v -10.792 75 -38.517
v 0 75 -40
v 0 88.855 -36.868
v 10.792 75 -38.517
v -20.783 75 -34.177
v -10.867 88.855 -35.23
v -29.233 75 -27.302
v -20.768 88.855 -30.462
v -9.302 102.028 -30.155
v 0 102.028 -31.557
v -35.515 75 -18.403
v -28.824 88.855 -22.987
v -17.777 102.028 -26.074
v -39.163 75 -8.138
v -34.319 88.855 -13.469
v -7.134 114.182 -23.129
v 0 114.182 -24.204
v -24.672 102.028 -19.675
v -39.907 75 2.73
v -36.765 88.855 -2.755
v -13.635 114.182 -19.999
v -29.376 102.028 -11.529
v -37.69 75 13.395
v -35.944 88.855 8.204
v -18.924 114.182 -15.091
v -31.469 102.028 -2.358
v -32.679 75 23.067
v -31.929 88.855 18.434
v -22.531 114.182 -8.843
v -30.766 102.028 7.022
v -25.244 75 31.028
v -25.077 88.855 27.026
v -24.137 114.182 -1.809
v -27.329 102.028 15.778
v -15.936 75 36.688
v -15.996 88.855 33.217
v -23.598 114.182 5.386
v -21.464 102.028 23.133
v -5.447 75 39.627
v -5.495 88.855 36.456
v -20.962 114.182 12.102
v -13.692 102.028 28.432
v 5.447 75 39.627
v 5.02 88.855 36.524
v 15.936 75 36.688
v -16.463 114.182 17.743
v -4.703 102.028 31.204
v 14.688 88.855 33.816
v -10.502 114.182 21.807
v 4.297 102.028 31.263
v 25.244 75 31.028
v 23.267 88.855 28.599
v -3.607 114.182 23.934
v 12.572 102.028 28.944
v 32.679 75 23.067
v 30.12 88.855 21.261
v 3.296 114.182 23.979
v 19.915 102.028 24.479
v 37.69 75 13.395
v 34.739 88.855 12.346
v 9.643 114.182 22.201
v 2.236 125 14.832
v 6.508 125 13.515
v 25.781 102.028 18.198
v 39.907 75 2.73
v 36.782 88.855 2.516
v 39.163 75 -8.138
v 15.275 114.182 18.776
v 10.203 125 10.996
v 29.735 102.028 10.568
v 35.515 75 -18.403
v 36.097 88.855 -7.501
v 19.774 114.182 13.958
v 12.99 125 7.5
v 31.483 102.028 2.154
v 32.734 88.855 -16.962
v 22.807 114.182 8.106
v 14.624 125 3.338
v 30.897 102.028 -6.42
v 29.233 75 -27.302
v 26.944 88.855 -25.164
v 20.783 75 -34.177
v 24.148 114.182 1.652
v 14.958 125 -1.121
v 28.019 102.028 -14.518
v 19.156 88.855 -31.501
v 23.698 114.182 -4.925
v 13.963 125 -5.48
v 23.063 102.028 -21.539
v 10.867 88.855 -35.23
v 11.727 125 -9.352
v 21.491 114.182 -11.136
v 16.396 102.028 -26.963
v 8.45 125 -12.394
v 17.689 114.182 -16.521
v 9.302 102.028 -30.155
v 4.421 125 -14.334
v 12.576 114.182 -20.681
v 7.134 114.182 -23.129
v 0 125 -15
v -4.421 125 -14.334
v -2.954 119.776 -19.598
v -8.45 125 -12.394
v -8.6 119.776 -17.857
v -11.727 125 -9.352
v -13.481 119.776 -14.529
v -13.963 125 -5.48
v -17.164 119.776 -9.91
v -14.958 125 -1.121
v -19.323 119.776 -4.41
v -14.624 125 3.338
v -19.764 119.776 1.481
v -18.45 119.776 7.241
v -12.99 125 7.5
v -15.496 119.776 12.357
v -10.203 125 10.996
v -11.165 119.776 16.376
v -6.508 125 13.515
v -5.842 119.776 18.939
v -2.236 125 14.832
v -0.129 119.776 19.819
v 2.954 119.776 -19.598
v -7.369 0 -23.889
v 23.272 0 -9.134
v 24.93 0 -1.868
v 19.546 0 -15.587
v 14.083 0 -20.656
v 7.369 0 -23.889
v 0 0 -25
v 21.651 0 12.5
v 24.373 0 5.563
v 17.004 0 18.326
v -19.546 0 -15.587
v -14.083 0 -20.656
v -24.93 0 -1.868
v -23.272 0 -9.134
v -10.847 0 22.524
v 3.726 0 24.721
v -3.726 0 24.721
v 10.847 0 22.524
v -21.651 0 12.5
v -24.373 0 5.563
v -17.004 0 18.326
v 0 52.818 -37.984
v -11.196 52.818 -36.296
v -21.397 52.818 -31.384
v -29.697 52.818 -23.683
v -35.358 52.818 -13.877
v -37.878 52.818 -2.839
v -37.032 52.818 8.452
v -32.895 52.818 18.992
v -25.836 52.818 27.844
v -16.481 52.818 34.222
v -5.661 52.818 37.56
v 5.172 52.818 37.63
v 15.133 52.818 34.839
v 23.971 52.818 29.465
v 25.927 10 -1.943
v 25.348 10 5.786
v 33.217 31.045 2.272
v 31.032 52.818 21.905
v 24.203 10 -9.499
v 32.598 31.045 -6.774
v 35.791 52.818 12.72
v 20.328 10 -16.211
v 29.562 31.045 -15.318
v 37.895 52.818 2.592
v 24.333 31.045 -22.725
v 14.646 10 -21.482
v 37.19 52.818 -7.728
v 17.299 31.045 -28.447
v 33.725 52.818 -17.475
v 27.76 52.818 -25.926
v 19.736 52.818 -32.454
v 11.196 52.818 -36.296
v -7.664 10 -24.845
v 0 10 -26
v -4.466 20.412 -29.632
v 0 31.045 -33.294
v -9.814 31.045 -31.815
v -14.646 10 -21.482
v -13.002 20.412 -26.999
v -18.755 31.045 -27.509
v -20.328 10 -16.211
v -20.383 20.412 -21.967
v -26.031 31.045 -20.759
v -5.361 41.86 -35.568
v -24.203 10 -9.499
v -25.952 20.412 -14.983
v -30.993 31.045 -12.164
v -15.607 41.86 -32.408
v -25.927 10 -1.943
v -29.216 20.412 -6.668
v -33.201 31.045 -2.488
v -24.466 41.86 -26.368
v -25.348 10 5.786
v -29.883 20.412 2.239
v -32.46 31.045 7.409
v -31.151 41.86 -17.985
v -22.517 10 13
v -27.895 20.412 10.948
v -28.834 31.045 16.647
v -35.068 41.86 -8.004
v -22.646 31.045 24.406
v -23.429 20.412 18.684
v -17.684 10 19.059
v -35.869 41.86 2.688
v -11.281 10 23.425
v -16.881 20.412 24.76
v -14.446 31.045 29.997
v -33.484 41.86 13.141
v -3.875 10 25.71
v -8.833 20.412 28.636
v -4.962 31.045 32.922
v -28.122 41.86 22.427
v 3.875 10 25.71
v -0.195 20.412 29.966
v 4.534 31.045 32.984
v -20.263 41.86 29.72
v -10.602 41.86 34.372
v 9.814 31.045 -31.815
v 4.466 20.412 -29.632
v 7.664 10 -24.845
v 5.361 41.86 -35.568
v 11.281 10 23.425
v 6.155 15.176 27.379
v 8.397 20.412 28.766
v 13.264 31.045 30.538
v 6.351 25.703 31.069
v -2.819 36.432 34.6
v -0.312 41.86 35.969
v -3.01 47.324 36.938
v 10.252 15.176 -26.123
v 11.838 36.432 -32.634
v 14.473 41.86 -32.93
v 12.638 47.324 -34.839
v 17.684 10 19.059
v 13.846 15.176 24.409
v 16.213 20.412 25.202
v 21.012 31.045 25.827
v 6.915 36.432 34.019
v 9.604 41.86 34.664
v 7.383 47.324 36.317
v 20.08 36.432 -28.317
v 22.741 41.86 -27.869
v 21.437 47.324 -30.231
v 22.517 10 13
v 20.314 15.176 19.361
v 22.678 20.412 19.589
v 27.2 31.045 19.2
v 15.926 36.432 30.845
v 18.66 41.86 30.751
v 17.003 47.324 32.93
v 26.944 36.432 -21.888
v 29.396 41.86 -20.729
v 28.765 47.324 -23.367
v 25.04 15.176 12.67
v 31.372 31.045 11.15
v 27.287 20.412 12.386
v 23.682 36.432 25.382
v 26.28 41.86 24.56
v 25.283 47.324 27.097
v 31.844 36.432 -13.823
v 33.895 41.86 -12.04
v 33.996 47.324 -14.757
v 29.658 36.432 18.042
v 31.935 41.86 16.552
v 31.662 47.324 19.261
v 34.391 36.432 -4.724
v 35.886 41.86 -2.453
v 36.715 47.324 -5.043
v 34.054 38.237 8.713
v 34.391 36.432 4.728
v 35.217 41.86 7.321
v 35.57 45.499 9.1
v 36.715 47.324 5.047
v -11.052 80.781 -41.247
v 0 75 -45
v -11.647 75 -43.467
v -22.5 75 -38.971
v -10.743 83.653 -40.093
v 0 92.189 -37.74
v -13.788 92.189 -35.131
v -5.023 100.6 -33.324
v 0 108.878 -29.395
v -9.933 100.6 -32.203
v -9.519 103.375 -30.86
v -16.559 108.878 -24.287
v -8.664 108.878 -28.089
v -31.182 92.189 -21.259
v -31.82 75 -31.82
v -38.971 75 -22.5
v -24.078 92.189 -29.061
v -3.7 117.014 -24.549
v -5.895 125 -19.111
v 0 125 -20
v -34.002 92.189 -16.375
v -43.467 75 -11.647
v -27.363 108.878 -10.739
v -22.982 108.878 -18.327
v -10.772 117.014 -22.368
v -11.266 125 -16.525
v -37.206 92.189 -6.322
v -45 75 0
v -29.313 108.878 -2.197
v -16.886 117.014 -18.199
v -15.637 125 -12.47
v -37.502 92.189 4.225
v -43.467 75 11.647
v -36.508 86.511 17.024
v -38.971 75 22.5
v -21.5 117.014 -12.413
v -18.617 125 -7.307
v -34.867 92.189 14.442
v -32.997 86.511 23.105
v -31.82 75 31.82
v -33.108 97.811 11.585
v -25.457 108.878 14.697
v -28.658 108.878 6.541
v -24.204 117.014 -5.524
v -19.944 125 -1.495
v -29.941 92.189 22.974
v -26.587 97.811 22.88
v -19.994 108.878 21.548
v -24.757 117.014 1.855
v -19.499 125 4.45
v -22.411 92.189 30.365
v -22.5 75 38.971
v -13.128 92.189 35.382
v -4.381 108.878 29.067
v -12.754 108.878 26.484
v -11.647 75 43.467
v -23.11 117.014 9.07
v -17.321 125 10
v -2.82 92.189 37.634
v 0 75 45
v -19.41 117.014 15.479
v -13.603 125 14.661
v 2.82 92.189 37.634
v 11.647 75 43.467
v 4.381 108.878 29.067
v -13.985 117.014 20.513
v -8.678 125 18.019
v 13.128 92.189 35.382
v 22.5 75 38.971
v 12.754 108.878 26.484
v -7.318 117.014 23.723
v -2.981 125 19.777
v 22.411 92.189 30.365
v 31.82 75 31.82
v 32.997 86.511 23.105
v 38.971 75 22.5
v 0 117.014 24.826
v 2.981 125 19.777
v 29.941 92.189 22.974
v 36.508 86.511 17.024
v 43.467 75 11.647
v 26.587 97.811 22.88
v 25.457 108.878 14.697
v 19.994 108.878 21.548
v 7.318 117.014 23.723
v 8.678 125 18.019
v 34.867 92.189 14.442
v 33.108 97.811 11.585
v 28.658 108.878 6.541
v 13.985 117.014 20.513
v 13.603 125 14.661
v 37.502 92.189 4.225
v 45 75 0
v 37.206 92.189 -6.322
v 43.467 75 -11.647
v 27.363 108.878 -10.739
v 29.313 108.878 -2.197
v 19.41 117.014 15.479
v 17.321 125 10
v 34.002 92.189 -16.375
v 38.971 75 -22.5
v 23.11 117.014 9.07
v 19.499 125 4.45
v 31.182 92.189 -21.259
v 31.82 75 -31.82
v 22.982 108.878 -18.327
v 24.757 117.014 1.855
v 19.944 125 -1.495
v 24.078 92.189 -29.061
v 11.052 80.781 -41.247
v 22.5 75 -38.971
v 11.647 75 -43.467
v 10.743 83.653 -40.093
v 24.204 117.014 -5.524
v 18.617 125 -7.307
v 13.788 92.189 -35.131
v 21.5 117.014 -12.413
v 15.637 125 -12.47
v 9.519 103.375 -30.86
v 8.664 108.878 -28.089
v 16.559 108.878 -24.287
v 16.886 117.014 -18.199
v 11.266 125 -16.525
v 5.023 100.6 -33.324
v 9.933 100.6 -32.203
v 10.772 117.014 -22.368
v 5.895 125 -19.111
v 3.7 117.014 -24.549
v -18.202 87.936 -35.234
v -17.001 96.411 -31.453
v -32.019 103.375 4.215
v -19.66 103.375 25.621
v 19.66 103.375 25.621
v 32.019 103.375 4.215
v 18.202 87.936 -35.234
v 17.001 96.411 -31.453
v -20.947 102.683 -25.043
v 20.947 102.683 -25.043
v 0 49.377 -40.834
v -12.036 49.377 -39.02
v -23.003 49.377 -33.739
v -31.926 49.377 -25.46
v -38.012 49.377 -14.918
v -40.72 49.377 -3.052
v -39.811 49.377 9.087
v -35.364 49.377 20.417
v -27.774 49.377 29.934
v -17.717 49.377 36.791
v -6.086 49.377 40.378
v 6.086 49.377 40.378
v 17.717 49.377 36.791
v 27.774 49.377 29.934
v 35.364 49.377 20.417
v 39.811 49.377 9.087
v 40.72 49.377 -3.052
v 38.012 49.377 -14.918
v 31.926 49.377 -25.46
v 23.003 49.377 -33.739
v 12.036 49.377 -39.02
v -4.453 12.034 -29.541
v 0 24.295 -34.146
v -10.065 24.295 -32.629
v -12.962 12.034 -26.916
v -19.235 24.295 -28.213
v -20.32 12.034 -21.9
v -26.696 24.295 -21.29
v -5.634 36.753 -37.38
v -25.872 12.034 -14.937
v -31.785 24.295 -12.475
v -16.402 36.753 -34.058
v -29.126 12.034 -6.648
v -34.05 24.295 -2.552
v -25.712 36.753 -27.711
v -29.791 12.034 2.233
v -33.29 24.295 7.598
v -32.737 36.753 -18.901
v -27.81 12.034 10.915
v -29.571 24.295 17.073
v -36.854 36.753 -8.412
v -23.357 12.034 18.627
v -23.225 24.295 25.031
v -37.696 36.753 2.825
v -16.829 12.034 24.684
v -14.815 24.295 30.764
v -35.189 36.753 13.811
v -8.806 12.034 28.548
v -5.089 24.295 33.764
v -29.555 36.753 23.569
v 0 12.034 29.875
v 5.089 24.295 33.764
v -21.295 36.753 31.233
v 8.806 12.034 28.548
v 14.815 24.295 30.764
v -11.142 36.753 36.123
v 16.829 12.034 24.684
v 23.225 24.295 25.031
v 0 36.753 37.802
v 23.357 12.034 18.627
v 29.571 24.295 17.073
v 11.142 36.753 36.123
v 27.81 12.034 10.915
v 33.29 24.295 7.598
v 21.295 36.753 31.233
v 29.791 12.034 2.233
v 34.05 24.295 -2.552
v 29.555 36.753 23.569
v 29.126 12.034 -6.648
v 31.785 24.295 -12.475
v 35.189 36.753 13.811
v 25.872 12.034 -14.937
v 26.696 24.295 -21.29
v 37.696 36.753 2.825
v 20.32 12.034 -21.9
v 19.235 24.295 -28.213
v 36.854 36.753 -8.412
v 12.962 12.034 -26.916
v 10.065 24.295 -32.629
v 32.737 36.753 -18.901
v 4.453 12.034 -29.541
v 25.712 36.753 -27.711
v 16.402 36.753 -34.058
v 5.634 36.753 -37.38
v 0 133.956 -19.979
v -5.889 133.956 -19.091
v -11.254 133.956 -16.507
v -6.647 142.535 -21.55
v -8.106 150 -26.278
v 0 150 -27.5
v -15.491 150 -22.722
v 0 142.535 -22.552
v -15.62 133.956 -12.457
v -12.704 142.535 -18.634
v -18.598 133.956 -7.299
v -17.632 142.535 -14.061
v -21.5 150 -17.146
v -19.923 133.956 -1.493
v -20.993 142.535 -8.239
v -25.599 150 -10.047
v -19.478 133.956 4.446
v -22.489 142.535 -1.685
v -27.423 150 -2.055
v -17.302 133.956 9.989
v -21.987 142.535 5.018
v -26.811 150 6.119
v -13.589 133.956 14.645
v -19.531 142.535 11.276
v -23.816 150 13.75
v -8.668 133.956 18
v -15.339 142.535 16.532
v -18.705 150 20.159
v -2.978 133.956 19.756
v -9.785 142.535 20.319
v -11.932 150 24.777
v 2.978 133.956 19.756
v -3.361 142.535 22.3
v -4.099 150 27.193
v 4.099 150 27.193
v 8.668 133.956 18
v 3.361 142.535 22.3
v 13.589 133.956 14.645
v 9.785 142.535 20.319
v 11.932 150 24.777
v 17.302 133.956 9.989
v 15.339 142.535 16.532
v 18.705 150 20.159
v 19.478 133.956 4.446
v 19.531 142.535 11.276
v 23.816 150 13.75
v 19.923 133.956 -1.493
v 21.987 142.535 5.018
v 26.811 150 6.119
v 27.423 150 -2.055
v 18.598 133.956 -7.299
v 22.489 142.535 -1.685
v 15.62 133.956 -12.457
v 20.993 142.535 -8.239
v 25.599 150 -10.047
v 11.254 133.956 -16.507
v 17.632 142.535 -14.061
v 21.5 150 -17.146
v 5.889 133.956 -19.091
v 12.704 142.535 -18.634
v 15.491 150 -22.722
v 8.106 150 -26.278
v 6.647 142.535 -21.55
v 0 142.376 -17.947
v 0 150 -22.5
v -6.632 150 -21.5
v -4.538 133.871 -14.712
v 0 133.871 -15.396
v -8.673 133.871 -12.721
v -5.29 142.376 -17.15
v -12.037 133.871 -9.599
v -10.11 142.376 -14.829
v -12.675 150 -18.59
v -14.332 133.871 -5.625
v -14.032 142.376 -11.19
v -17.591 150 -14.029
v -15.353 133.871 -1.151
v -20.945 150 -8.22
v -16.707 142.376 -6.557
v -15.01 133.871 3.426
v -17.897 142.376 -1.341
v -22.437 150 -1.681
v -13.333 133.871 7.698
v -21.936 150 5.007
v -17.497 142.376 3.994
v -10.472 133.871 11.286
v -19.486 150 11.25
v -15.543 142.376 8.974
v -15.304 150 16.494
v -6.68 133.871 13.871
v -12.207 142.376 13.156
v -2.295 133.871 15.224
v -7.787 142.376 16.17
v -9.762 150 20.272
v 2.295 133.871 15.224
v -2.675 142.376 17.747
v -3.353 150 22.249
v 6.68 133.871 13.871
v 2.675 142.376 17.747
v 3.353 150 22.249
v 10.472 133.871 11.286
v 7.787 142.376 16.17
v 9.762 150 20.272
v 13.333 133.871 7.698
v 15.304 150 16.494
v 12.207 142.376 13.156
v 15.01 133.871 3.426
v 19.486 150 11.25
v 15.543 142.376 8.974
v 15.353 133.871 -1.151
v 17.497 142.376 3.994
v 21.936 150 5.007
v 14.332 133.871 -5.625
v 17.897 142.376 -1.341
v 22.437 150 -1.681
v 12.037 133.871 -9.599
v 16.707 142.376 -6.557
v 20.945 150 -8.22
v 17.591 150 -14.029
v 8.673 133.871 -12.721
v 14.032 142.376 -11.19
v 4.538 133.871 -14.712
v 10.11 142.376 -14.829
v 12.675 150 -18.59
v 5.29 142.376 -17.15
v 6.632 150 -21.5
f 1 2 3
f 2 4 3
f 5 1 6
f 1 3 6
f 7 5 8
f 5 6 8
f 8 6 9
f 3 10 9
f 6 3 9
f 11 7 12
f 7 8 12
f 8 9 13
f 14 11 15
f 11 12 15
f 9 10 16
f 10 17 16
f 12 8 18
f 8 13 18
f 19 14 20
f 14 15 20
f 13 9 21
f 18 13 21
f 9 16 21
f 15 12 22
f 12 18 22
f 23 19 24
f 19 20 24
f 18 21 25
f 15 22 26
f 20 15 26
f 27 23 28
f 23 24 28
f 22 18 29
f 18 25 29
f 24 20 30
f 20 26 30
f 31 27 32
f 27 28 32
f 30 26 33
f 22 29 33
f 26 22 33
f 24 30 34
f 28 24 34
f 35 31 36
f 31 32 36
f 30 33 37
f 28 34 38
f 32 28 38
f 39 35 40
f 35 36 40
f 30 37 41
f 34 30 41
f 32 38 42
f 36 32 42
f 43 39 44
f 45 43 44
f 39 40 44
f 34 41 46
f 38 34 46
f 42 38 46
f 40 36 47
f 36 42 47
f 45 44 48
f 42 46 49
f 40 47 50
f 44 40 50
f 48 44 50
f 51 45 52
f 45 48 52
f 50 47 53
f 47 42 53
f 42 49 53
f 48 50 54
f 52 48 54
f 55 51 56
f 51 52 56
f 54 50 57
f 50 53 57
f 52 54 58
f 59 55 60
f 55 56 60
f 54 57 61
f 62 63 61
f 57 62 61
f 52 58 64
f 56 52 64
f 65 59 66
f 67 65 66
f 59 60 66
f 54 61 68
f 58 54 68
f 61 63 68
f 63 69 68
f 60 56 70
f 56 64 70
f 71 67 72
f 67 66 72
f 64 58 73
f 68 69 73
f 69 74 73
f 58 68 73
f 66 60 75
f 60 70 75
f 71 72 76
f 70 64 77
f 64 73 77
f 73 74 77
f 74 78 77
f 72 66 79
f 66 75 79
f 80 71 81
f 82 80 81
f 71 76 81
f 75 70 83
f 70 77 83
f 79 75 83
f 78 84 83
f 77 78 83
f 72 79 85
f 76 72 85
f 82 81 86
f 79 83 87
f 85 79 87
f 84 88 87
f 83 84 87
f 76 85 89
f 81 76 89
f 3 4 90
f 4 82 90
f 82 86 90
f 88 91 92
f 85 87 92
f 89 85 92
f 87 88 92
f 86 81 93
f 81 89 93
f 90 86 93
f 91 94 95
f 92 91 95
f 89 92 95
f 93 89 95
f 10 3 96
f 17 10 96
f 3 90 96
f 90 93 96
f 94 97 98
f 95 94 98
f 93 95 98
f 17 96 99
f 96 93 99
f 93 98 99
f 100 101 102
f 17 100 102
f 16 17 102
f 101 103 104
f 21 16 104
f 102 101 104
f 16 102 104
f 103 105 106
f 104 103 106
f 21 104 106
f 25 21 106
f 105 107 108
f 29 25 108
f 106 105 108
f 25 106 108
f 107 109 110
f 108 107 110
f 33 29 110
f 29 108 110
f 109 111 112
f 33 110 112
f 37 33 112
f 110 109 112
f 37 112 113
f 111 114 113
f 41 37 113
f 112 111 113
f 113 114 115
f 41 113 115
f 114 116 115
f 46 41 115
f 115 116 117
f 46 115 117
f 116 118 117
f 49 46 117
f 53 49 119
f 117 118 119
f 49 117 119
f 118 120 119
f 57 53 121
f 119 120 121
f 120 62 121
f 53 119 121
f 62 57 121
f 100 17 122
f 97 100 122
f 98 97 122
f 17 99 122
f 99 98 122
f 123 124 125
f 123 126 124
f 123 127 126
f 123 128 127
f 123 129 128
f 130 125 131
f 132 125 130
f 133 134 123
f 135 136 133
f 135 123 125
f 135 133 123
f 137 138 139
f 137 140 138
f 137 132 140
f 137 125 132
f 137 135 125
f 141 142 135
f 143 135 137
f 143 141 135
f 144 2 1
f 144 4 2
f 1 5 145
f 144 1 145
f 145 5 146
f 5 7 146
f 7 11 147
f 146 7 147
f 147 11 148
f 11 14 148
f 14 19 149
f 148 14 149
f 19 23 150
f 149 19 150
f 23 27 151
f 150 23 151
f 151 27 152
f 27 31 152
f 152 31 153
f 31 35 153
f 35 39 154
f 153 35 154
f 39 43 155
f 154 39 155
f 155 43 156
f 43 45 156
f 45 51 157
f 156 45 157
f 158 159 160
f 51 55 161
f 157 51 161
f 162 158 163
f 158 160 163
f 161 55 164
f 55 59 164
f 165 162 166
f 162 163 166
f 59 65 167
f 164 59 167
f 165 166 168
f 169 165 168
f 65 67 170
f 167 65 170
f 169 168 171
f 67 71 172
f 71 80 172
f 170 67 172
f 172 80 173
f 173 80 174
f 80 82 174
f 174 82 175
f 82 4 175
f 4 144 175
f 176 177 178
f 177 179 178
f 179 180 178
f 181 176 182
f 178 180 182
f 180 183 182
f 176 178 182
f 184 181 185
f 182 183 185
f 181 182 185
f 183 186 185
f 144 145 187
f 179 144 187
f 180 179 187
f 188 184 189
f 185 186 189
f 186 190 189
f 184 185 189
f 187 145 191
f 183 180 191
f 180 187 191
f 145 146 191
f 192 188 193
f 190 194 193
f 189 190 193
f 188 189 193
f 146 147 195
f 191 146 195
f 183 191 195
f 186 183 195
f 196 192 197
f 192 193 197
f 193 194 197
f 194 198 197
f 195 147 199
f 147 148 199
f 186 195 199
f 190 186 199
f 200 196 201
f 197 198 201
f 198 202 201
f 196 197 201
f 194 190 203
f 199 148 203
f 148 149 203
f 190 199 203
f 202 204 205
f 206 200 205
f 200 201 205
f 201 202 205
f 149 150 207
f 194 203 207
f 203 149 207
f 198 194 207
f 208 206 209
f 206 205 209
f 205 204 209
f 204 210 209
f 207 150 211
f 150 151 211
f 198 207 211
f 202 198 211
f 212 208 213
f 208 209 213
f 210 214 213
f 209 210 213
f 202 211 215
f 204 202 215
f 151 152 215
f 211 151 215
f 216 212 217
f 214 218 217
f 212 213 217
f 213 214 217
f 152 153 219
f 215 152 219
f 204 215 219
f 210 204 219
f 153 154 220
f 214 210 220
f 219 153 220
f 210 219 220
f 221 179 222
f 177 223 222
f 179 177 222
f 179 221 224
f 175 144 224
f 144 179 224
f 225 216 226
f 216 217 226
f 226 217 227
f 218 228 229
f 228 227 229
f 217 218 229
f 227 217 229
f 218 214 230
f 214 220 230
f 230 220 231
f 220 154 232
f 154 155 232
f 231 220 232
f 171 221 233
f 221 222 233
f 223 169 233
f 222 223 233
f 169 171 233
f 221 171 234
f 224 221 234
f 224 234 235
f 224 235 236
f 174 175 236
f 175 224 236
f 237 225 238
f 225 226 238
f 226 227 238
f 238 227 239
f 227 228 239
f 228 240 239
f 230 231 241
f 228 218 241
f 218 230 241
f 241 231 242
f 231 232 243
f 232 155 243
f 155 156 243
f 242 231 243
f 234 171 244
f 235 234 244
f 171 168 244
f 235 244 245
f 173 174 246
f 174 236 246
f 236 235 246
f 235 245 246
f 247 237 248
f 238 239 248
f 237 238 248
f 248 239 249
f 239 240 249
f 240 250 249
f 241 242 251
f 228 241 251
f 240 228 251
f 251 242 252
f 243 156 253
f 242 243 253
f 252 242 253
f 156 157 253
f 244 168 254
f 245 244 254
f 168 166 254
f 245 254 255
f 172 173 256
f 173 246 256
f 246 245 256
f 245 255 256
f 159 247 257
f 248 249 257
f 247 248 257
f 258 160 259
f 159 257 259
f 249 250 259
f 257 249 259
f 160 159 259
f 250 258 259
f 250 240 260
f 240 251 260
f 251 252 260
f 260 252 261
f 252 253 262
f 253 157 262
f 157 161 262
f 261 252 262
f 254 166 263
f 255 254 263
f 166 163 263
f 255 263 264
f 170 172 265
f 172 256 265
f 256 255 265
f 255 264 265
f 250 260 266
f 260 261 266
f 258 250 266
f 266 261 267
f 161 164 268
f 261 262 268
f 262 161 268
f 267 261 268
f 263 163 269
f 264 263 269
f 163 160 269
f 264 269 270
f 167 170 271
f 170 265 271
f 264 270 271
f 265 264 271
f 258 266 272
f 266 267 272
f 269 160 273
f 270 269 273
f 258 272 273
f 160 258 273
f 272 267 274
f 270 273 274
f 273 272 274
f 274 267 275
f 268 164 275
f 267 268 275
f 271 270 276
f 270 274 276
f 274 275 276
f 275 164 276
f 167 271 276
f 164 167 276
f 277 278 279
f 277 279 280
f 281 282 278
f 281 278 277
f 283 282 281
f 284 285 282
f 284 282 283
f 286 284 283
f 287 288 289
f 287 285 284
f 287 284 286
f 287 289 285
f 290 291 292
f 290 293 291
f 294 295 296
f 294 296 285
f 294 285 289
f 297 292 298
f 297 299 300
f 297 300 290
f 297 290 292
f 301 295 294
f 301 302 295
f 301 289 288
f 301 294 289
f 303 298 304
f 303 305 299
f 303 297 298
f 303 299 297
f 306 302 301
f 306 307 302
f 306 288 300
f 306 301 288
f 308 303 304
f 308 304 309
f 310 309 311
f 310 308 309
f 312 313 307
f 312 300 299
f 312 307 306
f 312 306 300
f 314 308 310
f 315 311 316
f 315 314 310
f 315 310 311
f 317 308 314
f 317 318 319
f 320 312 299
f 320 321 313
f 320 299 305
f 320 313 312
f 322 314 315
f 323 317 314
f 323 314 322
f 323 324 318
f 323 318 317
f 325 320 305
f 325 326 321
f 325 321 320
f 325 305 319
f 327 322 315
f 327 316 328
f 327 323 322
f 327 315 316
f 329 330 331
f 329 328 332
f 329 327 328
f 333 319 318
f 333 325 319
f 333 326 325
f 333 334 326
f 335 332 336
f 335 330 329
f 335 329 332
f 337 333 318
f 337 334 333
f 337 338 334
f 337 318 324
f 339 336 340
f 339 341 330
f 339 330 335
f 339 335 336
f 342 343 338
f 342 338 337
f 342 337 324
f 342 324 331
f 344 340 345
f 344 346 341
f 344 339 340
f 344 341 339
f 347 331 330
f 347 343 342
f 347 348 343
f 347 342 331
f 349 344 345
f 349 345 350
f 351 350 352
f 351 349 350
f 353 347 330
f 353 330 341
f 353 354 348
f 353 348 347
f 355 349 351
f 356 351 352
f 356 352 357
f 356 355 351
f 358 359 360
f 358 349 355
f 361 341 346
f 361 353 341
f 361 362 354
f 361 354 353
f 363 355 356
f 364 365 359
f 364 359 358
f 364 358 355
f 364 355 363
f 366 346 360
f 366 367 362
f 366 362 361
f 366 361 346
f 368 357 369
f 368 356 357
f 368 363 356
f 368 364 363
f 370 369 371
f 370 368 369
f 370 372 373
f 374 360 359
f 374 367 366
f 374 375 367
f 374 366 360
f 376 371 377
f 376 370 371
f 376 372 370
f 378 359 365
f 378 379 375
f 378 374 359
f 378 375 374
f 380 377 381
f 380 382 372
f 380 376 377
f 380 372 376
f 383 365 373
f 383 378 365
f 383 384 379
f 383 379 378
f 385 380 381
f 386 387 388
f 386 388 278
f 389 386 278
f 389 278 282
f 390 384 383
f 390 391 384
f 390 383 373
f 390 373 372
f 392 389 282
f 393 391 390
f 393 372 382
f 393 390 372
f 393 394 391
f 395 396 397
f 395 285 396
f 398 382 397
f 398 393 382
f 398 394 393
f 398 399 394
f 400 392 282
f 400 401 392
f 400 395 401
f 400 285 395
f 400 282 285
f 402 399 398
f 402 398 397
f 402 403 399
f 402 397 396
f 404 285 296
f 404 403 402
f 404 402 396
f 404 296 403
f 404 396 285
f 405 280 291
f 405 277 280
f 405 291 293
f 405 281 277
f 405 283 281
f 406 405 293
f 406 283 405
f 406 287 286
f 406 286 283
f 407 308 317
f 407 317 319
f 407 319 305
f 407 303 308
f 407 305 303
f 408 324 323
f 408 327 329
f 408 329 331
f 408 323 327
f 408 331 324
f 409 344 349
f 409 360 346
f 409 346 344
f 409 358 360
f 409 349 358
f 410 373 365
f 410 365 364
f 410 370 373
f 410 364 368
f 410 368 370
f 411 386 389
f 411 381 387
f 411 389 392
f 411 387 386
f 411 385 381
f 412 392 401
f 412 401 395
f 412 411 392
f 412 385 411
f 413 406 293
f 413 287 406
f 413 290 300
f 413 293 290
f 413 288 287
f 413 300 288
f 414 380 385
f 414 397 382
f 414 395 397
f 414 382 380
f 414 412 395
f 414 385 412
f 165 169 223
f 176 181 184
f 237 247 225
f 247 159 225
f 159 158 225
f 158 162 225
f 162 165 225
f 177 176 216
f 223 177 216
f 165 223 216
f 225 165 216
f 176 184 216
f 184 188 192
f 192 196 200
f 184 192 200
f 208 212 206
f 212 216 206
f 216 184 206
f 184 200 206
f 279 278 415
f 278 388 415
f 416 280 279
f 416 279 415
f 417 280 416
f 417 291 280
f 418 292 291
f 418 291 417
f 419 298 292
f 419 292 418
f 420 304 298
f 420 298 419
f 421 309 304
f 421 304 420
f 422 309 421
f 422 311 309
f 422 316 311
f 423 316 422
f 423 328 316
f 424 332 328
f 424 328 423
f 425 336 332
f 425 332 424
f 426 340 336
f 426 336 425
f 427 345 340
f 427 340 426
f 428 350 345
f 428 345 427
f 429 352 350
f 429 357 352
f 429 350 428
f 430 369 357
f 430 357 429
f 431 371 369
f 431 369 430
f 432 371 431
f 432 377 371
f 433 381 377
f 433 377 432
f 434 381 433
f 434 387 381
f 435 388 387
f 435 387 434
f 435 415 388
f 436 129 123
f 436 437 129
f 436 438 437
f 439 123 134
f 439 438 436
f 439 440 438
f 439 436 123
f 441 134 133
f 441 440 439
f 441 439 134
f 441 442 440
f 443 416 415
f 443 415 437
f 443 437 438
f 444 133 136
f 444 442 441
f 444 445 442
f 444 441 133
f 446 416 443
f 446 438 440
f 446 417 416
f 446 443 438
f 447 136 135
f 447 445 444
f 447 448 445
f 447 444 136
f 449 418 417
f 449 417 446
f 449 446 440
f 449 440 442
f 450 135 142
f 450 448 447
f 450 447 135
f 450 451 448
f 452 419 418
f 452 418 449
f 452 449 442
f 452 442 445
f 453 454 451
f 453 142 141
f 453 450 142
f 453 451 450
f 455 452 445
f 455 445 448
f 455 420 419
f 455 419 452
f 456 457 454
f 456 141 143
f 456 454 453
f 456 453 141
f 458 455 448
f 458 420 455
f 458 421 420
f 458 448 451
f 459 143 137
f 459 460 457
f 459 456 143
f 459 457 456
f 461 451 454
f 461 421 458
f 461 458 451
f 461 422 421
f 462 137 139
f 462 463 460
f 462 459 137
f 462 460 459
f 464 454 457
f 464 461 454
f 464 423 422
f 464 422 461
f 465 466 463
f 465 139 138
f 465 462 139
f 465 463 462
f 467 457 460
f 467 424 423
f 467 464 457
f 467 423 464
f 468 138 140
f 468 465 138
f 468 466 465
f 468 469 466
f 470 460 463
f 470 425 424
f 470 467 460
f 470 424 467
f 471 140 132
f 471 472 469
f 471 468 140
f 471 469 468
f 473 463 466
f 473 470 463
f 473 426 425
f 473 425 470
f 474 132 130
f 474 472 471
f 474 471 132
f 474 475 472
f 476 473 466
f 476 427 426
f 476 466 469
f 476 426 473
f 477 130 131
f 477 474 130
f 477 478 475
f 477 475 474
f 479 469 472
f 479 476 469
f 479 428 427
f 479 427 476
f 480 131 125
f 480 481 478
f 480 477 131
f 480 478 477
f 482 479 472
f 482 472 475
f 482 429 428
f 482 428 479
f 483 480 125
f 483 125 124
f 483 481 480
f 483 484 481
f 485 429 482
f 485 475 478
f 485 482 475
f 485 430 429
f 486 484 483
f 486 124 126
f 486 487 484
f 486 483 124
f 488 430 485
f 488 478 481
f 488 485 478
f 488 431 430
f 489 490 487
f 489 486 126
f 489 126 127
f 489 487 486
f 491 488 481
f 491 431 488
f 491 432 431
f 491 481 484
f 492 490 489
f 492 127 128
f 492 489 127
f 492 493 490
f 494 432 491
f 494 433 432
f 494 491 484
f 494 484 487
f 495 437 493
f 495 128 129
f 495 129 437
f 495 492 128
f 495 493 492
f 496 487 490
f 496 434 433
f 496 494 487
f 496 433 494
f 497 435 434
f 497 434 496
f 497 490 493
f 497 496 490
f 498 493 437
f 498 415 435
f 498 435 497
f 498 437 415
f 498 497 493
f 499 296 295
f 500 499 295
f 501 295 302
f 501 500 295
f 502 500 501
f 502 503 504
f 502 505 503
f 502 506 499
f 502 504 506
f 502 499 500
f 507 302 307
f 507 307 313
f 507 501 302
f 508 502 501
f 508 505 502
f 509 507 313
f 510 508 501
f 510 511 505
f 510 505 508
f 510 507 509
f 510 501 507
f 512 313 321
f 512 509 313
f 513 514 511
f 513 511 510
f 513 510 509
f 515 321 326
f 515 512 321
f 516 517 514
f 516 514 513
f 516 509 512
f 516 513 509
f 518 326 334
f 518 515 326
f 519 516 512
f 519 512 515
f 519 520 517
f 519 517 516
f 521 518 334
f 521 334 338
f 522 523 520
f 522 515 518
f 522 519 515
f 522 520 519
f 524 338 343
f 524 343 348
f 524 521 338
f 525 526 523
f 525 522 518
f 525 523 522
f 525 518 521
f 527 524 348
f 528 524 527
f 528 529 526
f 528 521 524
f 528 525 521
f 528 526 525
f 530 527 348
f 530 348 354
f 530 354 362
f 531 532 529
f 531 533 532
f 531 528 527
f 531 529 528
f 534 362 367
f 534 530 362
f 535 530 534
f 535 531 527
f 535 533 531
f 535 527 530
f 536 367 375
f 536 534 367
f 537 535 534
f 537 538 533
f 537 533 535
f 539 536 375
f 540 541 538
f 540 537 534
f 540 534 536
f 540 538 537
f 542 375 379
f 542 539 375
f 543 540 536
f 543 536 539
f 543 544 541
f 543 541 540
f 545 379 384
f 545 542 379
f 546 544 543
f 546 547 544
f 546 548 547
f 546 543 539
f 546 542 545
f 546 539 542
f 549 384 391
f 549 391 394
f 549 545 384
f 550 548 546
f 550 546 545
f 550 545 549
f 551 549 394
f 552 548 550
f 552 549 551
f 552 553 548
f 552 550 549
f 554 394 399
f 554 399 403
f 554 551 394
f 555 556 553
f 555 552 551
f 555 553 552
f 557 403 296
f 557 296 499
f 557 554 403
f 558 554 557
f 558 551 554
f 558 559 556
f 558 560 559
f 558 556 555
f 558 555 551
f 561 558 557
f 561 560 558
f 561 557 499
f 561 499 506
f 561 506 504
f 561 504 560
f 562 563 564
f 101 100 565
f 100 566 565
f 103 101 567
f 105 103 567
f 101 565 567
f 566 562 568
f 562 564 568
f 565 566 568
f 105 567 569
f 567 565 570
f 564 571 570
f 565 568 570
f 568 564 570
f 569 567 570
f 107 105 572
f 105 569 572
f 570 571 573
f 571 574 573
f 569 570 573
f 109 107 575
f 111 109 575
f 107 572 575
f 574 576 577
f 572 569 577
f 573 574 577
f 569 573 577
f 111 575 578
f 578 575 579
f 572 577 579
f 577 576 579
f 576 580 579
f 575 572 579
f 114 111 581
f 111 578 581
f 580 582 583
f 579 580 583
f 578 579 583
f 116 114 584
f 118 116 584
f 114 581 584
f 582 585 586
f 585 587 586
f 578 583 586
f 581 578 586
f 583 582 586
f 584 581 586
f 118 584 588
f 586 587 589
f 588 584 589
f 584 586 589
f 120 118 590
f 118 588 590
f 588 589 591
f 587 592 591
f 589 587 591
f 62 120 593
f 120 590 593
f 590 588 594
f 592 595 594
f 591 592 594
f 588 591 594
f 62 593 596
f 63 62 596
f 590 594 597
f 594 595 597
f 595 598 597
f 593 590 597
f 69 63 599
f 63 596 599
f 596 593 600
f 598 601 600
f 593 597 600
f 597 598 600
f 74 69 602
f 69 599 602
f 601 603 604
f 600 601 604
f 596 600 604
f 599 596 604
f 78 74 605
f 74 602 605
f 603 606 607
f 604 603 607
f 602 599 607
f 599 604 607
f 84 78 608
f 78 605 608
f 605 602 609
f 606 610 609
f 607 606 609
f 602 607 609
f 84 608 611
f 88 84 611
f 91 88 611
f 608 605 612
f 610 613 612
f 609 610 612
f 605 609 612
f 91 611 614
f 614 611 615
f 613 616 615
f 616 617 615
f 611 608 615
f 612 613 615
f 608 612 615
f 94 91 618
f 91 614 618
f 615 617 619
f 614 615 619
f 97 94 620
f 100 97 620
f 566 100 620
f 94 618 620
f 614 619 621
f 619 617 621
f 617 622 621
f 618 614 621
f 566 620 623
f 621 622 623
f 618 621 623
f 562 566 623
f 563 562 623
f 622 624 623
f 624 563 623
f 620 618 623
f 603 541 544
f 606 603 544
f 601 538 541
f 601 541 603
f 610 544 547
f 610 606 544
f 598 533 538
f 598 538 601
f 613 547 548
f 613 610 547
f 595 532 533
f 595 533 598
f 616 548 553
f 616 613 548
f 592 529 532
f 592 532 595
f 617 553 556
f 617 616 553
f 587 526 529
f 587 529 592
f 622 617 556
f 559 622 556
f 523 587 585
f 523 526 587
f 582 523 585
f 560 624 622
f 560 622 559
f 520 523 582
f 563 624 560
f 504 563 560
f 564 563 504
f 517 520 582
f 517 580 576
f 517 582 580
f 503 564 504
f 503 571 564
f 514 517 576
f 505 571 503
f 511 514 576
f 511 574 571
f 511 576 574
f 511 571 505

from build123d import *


with BuildPart() as part:
    # 草图1 → 旋转1 (revolve)
    with BuildSketch(Plane.XY, mode=Mode.PRIVATE) as revolve_1_sk:
        with BuildLine():
            Line((0, 0), (25, 0))
            ThreePointArc((25, 0), (37.801935199, 36.75281728), (45, 75))
            ThreePointArc((45, 75), (33.700690007, 100.600345003), (20, 125))
            ThreePointArc((20, 125), (20.949829352, 138.340051194), (27.5, 150))
            Line((27.5, 150), (0, 150))
            Line((0, 150), (0, 0))
        make_face()
    revolve(revolve_1_sk.sketch.rotate(Axis((0, 0, 0), (0, 1, 0)), 90), axis=Axis((0, 0, 0), (0, 1, 0)))

    # 草图2 → 切除-旋转1 (revolve, cut)
    with BuildSketch(Plane.XY, mode=Mode.PRIVATE) as cut_revolve_1_sk:
        with BuildLine():
            Line((0, 10), (26, 10))
            ThreePointArc((26, 10), (35.96997071, 41.860314001), (40, 75))
            ThreePointArc((40, 75), (31.556941504, 102.028470752), (15, 125))
            ThreePointArc((15, 125), (16.408865103, 138.202340469), (22.5, 150))
            Line((22.5, 150), (0, 150))
            Line((0, 150), (0, 10))
        make_face()
    revolve(cut_revolve_1_sk.sketch.rotate(Axis((0, 0, 0), (0, 1, 0)), 90), axis=Axis((0, 0, 0), (0, 1, 0)), mode=Mode.SUBTRACT)


solid = part.part
